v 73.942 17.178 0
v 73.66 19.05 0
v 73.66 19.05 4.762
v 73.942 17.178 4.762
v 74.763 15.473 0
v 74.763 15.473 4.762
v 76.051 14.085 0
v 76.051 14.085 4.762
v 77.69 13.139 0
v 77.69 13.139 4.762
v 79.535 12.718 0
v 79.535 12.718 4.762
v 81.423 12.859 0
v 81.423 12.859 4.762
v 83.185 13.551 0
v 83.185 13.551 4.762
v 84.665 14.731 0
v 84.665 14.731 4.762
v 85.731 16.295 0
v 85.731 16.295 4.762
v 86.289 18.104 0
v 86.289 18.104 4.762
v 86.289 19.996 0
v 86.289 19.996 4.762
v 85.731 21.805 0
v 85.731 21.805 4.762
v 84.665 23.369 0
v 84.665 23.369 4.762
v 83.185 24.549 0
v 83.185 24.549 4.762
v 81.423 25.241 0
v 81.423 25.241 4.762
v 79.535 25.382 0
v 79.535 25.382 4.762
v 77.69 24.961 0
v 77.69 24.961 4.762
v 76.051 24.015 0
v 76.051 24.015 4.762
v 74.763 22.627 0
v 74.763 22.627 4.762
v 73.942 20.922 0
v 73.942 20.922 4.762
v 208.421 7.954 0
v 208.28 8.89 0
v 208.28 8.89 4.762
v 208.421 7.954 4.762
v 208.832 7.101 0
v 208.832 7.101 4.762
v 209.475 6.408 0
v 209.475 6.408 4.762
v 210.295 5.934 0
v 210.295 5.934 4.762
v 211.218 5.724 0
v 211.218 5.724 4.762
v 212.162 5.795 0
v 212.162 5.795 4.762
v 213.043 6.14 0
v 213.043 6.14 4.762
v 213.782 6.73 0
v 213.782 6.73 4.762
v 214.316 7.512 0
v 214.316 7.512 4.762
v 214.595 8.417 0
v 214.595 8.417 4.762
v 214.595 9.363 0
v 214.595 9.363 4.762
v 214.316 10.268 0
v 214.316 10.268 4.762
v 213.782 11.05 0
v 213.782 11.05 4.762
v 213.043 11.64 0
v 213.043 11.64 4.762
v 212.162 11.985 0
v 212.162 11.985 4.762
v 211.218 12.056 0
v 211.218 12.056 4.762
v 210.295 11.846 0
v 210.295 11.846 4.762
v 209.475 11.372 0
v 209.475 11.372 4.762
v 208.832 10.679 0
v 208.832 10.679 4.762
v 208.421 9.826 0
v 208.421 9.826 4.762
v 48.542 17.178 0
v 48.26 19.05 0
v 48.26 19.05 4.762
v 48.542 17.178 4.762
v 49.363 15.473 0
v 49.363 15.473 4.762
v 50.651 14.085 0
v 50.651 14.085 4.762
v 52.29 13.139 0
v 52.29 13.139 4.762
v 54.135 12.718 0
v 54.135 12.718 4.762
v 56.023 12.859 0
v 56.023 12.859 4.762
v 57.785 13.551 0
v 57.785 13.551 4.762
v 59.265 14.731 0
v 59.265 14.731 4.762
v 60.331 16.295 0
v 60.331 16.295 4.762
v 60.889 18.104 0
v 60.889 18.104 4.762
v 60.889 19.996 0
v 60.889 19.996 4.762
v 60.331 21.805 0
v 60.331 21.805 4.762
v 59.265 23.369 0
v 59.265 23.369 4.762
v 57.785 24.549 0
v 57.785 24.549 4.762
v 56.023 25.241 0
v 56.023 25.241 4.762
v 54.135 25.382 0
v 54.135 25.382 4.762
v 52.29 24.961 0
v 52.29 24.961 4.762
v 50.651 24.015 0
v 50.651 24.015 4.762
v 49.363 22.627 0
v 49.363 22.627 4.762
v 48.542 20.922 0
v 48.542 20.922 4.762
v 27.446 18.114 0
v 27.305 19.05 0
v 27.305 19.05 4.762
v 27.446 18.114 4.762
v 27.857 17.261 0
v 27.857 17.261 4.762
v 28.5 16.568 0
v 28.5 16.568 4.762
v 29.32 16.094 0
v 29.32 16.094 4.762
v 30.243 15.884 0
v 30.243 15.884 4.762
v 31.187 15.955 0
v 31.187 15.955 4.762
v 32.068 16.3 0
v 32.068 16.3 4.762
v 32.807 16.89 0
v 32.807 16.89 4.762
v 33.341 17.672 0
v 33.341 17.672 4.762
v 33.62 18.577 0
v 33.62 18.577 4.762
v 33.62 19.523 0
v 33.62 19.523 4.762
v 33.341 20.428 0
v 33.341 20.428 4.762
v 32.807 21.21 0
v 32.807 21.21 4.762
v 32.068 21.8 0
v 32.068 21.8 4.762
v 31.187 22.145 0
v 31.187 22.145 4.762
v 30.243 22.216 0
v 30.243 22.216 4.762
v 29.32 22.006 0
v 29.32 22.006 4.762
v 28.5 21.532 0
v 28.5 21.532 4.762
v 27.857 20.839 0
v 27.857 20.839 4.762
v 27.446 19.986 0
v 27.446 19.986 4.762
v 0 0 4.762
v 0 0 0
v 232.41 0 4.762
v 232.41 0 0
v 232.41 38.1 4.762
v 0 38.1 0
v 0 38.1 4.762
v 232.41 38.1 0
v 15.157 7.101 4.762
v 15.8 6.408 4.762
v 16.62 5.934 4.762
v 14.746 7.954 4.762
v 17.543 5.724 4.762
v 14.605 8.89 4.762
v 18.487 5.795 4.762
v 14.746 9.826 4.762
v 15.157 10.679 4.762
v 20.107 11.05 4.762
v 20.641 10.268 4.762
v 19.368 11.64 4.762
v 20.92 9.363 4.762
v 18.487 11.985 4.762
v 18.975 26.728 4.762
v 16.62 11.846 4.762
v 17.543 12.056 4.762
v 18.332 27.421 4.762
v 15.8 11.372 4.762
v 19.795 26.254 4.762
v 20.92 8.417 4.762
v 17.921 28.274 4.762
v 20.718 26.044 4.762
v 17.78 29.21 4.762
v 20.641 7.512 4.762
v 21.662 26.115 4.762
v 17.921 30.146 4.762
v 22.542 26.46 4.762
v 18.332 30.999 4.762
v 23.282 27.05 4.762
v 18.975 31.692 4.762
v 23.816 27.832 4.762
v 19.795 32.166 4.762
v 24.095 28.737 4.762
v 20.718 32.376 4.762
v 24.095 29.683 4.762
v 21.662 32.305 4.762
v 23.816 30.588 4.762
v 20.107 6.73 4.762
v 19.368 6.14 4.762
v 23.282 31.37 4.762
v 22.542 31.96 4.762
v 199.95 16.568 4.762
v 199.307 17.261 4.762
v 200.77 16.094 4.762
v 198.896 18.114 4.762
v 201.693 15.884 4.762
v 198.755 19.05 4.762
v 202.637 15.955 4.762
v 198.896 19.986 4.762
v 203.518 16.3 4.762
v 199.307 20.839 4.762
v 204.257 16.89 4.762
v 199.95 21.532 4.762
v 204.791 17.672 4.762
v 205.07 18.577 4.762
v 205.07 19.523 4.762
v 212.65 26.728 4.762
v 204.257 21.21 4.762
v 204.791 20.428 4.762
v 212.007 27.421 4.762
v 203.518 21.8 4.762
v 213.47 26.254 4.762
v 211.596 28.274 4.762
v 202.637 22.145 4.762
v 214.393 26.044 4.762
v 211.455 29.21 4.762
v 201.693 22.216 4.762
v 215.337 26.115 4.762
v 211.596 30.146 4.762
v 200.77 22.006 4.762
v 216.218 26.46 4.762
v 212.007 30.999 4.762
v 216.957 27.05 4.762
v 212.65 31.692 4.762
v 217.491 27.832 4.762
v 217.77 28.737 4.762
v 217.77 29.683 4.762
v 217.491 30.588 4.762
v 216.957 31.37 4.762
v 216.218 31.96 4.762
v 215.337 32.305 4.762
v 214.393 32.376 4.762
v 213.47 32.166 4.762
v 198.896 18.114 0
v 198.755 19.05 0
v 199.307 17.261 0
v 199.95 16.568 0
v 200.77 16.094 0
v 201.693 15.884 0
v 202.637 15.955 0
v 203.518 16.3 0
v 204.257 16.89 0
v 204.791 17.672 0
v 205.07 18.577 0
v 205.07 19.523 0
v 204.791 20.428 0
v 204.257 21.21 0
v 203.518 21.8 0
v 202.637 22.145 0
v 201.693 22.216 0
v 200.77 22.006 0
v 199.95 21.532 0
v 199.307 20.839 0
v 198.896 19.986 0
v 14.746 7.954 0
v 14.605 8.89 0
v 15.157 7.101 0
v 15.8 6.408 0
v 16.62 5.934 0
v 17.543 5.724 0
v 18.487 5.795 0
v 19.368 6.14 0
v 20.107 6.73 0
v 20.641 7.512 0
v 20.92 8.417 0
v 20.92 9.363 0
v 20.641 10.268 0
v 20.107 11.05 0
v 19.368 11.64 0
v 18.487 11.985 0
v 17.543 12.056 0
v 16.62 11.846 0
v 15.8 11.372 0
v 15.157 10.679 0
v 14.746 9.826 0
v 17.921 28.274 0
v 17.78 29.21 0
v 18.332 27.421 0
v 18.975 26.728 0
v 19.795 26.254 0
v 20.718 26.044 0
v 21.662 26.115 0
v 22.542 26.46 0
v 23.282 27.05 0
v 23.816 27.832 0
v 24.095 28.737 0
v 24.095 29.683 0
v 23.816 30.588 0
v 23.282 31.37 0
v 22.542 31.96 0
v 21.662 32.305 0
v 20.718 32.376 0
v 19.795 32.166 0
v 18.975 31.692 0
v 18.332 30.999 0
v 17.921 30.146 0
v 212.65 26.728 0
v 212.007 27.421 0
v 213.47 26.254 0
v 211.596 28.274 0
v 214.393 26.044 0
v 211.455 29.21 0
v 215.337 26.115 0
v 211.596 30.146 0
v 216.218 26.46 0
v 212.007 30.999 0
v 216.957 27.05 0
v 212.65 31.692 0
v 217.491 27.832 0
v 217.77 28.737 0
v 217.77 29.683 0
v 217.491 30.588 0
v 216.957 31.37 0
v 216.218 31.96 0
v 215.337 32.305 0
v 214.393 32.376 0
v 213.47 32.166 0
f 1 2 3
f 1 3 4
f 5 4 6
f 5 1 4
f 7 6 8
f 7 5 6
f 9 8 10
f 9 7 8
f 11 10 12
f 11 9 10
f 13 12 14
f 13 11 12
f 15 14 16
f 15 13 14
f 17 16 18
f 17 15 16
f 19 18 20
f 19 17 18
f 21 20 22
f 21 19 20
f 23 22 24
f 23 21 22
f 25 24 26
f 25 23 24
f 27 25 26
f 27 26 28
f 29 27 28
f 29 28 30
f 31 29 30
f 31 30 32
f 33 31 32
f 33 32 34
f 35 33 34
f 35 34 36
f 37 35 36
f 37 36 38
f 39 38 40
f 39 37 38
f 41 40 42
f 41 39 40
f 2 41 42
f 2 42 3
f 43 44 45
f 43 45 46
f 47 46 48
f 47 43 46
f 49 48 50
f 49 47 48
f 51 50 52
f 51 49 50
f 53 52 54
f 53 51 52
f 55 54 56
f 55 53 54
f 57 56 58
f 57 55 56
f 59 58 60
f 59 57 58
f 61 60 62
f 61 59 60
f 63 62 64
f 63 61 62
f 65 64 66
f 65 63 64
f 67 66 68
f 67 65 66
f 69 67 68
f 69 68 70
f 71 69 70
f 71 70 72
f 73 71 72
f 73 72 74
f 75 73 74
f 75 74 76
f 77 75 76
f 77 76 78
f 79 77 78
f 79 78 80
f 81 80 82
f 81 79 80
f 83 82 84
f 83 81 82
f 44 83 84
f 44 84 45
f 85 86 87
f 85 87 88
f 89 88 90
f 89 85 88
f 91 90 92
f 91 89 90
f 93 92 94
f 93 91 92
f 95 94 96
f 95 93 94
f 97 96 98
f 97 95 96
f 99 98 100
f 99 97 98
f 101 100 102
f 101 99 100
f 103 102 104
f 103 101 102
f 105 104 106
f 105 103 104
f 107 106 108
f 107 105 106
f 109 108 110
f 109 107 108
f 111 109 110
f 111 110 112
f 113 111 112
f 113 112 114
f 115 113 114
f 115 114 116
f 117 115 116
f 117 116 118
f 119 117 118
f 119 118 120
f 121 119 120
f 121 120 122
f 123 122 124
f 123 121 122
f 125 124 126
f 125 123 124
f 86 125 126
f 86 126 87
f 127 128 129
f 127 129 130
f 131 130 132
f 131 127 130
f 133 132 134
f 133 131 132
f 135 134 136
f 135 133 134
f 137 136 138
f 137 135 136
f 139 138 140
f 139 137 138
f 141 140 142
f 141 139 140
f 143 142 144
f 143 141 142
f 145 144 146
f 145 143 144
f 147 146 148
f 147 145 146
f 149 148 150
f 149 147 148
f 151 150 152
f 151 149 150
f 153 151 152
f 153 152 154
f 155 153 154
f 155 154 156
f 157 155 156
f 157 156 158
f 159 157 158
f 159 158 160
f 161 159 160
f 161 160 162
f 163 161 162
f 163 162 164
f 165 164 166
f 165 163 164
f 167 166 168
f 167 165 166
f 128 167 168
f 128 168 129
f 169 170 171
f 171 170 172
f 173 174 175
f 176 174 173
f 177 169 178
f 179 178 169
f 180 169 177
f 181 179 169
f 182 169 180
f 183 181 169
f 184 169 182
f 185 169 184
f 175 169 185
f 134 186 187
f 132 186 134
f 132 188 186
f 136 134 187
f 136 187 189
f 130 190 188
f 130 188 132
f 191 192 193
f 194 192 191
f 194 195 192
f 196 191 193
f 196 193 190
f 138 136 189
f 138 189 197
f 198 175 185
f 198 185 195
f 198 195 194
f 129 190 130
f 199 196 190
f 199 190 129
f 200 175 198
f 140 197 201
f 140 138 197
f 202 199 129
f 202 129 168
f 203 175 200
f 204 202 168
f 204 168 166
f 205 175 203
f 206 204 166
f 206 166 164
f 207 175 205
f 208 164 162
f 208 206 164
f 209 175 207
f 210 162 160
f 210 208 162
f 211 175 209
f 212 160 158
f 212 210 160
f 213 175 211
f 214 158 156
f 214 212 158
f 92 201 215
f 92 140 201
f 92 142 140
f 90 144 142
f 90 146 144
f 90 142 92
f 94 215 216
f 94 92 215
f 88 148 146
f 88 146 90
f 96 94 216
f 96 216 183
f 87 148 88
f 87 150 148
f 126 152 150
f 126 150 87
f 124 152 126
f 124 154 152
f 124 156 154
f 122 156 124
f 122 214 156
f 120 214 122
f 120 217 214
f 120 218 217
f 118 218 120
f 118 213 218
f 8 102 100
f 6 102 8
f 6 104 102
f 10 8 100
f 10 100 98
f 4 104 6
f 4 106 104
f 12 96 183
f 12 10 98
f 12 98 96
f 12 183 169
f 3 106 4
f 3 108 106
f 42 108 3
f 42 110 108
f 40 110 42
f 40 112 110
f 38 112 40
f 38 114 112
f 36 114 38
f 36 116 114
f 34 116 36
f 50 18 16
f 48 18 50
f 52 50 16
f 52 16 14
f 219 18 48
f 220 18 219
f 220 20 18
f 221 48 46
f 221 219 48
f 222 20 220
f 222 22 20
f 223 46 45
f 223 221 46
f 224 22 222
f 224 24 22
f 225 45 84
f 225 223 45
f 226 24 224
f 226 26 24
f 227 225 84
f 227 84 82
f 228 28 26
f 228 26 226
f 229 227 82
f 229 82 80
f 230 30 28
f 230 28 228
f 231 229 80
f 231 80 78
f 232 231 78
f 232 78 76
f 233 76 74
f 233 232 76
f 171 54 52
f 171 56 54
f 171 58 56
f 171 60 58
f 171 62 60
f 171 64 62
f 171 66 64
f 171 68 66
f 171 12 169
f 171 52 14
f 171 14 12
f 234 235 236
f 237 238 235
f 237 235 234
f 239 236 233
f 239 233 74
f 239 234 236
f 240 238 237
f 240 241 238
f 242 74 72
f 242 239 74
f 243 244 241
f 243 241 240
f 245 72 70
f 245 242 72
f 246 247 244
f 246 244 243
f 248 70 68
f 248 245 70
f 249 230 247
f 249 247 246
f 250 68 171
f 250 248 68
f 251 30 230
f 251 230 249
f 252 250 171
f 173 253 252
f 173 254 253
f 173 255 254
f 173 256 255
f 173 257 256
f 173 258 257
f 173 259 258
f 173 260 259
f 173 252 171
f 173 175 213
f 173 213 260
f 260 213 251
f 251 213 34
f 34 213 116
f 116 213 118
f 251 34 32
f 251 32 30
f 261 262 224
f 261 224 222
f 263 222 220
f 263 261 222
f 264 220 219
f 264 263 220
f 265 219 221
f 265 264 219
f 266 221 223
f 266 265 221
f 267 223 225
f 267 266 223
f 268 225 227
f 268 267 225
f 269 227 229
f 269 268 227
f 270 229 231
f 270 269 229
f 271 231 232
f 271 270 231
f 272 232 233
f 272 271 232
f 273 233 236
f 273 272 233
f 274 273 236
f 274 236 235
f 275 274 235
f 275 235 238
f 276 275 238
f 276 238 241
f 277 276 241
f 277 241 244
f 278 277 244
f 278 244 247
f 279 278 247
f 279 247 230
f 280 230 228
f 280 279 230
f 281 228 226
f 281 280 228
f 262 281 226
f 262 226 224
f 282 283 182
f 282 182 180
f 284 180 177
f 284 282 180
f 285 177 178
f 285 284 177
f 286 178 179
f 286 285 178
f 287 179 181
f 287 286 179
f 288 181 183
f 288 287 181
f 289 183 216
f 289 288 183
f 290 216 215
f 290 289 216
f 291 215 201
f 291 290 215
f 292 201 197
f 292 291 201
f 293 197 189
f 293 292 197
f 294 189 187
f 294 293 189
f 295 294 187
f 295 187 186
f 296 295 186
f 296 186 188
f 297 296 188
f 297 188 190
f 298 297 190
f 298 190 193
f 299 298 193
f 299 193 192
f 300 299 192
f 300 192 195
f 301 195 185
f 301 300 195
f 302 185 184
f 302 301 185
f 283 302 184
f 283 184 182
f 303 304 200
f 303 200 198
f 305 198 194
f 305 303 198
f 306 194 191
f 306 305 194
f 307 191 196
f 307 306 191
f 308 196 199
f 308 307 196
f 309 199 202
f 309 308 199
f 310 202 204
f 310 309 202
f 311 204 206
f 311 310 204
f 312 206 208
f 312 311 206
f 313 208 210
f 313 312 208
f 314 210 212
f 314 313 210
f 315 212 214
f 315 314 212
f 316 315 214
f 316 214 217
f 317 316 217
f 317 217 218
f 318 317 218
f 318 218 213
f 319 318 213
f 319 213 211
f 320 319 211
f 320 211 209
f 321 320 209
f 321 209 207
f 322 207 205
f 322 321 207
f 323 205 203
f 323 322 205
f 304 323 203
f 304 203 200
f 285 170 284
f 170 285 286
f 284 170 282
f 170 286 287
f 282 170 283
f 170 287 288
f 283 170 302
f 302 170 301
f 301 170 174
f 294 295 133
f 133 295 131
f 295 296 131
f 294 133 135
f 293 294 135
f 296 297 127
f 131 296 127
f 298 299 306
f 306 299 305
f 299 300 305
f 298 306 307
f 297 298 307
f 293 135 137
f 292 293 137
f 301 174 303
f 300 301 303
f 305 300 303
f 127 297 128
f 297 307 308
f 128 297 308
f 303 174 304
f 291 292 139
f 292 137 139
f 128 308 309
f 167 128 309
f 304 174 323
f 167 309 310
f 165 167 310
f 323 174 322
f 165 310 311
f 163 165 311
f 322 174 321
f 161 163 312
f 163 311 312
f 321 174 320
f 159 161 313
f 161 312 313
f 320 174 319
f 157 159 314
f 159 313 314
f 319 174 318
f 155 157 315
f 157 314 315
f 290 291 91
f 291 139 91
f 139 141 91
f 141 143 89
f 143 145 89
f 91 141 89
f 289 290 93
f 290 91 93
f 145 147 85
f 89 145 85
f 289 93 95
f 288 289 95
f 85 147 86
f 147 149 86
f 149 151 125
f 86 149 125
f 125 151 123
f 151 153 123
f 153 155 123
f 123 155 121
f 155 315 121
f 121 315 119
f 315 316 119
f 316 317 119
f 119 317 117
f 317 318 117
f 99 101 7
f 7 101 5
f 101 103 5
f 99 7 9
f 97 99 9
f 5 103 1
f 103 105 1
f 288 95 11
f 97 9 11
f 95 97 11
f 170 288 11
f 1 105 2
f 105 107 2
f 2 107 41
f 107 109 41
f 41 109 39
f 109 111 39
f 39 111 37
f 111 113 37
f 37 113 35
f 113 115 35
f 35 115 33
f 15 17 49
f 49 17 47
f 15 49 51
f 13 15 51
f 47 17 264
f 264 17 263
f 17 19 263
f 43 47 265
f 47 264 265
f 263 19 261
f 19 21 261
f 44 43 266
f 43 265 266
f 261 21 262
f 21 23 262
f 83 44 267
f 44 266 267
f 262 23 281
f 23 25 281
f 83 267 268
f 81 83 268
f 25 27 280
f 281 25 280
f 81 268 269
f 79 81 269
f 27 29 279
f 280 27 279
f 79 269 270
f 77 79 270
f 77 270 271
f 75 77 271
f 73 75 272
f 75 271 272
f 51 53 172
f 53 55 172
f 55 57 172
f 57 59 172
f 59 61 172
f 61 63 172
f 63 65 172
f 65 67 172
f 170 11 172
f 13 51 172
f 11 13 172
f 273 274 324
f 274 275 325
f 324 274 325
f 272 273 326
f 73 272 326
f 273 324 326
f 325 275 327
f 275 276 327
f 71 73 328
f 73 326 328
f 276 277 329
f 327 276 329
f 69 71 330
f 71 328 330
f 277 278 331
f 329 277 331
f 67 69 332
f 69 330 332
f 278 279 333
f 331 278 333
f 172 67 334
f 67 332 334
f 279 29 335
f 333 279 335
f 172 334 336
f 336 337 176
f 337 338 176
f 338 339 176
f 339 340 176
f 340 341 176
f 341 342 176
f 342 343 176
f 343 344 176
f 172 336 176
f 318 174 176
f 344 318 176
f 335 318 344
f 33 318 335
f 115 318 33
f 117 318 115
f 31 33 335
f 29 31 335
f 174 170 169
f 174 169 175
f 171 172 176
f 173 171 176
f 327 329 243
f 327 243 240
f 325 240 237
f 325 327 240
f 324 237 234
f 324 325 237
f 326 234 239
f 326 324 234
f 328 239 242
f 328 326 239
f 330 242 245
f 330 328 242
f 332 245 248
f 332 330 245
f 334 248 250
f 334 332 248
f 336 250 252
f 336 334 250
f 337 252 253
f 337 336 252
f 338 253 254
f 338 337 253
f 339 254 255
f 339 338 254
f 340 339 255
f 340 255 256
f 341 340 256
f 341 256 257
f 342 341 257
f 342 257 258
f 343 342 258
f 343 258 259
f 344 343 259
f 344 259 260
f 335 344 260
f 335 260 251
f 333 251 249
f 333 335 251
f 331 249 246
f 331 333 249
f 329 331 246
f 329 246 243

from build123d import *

# Parameters (mm, degrees)
SKETCH1_W           = 232.41
SKETCH1_H           = 38.1
SKETCH1_R           = 3.175
SKETCH1_R_2         = 6.35
BOSS_EXTRUDE1_DEPTH = 4.7625


with BuildPart() as part:
    # Sketch1 → Boss-Extrude1 (new body)
    with BuildSketch(Plane.XY):
        with Locations((116.205, 19.05)):
            Rectangle(SKETCH1_W, SKETCH1_H)
        with Locations(Location((30.48, 19.05, 0), (0, 0, 180))):
            Circle(SKETCH1_R, mode=Mode.SUBTRACT)
        with Locations(Location((80.01, 19.05, 0), (0, 0, 180))):
            Circle(SKETCH1_R_2, mode=Mode.SUBTRACT)
        with Locations(Location((20.955, 29.21, 0), (0, 0, 180))):
            Circle(SKETCH1_R, mode=Mode.SUBTRACT)
        with Locations(Location((17.78, 8.89, 0), (0, 0, 180))):
            Circle(SKETCH1_R, mode=Mode.SUBTRACT)
        with Locations(Location((214.63, 29.21, 0), (0, 0, 180))):
            Circle(SKETCH1_R, mode=Mode.SUBTRACT)
        with Locations(Location((201.93, 19.05, 0), (0, 0, 180))):
            Circle(SKETCH1_R, mode=Mode.SUBTRACT)
        with Locations(Location((211.455, 8.89, 0), (0, 0, 180))):
            Circle(SKETCH1_R, mode=Mode.SUBTRACT)
        with Locations(Location((54.61, 19.05, 0), (0, 0, 180))):
            Circle(SKETCH1_R_2, mode=Mode.SUBTRACT)
    extrude(amount=BOSS_EXTRUDE1_DEPTH)


solid = part.part
